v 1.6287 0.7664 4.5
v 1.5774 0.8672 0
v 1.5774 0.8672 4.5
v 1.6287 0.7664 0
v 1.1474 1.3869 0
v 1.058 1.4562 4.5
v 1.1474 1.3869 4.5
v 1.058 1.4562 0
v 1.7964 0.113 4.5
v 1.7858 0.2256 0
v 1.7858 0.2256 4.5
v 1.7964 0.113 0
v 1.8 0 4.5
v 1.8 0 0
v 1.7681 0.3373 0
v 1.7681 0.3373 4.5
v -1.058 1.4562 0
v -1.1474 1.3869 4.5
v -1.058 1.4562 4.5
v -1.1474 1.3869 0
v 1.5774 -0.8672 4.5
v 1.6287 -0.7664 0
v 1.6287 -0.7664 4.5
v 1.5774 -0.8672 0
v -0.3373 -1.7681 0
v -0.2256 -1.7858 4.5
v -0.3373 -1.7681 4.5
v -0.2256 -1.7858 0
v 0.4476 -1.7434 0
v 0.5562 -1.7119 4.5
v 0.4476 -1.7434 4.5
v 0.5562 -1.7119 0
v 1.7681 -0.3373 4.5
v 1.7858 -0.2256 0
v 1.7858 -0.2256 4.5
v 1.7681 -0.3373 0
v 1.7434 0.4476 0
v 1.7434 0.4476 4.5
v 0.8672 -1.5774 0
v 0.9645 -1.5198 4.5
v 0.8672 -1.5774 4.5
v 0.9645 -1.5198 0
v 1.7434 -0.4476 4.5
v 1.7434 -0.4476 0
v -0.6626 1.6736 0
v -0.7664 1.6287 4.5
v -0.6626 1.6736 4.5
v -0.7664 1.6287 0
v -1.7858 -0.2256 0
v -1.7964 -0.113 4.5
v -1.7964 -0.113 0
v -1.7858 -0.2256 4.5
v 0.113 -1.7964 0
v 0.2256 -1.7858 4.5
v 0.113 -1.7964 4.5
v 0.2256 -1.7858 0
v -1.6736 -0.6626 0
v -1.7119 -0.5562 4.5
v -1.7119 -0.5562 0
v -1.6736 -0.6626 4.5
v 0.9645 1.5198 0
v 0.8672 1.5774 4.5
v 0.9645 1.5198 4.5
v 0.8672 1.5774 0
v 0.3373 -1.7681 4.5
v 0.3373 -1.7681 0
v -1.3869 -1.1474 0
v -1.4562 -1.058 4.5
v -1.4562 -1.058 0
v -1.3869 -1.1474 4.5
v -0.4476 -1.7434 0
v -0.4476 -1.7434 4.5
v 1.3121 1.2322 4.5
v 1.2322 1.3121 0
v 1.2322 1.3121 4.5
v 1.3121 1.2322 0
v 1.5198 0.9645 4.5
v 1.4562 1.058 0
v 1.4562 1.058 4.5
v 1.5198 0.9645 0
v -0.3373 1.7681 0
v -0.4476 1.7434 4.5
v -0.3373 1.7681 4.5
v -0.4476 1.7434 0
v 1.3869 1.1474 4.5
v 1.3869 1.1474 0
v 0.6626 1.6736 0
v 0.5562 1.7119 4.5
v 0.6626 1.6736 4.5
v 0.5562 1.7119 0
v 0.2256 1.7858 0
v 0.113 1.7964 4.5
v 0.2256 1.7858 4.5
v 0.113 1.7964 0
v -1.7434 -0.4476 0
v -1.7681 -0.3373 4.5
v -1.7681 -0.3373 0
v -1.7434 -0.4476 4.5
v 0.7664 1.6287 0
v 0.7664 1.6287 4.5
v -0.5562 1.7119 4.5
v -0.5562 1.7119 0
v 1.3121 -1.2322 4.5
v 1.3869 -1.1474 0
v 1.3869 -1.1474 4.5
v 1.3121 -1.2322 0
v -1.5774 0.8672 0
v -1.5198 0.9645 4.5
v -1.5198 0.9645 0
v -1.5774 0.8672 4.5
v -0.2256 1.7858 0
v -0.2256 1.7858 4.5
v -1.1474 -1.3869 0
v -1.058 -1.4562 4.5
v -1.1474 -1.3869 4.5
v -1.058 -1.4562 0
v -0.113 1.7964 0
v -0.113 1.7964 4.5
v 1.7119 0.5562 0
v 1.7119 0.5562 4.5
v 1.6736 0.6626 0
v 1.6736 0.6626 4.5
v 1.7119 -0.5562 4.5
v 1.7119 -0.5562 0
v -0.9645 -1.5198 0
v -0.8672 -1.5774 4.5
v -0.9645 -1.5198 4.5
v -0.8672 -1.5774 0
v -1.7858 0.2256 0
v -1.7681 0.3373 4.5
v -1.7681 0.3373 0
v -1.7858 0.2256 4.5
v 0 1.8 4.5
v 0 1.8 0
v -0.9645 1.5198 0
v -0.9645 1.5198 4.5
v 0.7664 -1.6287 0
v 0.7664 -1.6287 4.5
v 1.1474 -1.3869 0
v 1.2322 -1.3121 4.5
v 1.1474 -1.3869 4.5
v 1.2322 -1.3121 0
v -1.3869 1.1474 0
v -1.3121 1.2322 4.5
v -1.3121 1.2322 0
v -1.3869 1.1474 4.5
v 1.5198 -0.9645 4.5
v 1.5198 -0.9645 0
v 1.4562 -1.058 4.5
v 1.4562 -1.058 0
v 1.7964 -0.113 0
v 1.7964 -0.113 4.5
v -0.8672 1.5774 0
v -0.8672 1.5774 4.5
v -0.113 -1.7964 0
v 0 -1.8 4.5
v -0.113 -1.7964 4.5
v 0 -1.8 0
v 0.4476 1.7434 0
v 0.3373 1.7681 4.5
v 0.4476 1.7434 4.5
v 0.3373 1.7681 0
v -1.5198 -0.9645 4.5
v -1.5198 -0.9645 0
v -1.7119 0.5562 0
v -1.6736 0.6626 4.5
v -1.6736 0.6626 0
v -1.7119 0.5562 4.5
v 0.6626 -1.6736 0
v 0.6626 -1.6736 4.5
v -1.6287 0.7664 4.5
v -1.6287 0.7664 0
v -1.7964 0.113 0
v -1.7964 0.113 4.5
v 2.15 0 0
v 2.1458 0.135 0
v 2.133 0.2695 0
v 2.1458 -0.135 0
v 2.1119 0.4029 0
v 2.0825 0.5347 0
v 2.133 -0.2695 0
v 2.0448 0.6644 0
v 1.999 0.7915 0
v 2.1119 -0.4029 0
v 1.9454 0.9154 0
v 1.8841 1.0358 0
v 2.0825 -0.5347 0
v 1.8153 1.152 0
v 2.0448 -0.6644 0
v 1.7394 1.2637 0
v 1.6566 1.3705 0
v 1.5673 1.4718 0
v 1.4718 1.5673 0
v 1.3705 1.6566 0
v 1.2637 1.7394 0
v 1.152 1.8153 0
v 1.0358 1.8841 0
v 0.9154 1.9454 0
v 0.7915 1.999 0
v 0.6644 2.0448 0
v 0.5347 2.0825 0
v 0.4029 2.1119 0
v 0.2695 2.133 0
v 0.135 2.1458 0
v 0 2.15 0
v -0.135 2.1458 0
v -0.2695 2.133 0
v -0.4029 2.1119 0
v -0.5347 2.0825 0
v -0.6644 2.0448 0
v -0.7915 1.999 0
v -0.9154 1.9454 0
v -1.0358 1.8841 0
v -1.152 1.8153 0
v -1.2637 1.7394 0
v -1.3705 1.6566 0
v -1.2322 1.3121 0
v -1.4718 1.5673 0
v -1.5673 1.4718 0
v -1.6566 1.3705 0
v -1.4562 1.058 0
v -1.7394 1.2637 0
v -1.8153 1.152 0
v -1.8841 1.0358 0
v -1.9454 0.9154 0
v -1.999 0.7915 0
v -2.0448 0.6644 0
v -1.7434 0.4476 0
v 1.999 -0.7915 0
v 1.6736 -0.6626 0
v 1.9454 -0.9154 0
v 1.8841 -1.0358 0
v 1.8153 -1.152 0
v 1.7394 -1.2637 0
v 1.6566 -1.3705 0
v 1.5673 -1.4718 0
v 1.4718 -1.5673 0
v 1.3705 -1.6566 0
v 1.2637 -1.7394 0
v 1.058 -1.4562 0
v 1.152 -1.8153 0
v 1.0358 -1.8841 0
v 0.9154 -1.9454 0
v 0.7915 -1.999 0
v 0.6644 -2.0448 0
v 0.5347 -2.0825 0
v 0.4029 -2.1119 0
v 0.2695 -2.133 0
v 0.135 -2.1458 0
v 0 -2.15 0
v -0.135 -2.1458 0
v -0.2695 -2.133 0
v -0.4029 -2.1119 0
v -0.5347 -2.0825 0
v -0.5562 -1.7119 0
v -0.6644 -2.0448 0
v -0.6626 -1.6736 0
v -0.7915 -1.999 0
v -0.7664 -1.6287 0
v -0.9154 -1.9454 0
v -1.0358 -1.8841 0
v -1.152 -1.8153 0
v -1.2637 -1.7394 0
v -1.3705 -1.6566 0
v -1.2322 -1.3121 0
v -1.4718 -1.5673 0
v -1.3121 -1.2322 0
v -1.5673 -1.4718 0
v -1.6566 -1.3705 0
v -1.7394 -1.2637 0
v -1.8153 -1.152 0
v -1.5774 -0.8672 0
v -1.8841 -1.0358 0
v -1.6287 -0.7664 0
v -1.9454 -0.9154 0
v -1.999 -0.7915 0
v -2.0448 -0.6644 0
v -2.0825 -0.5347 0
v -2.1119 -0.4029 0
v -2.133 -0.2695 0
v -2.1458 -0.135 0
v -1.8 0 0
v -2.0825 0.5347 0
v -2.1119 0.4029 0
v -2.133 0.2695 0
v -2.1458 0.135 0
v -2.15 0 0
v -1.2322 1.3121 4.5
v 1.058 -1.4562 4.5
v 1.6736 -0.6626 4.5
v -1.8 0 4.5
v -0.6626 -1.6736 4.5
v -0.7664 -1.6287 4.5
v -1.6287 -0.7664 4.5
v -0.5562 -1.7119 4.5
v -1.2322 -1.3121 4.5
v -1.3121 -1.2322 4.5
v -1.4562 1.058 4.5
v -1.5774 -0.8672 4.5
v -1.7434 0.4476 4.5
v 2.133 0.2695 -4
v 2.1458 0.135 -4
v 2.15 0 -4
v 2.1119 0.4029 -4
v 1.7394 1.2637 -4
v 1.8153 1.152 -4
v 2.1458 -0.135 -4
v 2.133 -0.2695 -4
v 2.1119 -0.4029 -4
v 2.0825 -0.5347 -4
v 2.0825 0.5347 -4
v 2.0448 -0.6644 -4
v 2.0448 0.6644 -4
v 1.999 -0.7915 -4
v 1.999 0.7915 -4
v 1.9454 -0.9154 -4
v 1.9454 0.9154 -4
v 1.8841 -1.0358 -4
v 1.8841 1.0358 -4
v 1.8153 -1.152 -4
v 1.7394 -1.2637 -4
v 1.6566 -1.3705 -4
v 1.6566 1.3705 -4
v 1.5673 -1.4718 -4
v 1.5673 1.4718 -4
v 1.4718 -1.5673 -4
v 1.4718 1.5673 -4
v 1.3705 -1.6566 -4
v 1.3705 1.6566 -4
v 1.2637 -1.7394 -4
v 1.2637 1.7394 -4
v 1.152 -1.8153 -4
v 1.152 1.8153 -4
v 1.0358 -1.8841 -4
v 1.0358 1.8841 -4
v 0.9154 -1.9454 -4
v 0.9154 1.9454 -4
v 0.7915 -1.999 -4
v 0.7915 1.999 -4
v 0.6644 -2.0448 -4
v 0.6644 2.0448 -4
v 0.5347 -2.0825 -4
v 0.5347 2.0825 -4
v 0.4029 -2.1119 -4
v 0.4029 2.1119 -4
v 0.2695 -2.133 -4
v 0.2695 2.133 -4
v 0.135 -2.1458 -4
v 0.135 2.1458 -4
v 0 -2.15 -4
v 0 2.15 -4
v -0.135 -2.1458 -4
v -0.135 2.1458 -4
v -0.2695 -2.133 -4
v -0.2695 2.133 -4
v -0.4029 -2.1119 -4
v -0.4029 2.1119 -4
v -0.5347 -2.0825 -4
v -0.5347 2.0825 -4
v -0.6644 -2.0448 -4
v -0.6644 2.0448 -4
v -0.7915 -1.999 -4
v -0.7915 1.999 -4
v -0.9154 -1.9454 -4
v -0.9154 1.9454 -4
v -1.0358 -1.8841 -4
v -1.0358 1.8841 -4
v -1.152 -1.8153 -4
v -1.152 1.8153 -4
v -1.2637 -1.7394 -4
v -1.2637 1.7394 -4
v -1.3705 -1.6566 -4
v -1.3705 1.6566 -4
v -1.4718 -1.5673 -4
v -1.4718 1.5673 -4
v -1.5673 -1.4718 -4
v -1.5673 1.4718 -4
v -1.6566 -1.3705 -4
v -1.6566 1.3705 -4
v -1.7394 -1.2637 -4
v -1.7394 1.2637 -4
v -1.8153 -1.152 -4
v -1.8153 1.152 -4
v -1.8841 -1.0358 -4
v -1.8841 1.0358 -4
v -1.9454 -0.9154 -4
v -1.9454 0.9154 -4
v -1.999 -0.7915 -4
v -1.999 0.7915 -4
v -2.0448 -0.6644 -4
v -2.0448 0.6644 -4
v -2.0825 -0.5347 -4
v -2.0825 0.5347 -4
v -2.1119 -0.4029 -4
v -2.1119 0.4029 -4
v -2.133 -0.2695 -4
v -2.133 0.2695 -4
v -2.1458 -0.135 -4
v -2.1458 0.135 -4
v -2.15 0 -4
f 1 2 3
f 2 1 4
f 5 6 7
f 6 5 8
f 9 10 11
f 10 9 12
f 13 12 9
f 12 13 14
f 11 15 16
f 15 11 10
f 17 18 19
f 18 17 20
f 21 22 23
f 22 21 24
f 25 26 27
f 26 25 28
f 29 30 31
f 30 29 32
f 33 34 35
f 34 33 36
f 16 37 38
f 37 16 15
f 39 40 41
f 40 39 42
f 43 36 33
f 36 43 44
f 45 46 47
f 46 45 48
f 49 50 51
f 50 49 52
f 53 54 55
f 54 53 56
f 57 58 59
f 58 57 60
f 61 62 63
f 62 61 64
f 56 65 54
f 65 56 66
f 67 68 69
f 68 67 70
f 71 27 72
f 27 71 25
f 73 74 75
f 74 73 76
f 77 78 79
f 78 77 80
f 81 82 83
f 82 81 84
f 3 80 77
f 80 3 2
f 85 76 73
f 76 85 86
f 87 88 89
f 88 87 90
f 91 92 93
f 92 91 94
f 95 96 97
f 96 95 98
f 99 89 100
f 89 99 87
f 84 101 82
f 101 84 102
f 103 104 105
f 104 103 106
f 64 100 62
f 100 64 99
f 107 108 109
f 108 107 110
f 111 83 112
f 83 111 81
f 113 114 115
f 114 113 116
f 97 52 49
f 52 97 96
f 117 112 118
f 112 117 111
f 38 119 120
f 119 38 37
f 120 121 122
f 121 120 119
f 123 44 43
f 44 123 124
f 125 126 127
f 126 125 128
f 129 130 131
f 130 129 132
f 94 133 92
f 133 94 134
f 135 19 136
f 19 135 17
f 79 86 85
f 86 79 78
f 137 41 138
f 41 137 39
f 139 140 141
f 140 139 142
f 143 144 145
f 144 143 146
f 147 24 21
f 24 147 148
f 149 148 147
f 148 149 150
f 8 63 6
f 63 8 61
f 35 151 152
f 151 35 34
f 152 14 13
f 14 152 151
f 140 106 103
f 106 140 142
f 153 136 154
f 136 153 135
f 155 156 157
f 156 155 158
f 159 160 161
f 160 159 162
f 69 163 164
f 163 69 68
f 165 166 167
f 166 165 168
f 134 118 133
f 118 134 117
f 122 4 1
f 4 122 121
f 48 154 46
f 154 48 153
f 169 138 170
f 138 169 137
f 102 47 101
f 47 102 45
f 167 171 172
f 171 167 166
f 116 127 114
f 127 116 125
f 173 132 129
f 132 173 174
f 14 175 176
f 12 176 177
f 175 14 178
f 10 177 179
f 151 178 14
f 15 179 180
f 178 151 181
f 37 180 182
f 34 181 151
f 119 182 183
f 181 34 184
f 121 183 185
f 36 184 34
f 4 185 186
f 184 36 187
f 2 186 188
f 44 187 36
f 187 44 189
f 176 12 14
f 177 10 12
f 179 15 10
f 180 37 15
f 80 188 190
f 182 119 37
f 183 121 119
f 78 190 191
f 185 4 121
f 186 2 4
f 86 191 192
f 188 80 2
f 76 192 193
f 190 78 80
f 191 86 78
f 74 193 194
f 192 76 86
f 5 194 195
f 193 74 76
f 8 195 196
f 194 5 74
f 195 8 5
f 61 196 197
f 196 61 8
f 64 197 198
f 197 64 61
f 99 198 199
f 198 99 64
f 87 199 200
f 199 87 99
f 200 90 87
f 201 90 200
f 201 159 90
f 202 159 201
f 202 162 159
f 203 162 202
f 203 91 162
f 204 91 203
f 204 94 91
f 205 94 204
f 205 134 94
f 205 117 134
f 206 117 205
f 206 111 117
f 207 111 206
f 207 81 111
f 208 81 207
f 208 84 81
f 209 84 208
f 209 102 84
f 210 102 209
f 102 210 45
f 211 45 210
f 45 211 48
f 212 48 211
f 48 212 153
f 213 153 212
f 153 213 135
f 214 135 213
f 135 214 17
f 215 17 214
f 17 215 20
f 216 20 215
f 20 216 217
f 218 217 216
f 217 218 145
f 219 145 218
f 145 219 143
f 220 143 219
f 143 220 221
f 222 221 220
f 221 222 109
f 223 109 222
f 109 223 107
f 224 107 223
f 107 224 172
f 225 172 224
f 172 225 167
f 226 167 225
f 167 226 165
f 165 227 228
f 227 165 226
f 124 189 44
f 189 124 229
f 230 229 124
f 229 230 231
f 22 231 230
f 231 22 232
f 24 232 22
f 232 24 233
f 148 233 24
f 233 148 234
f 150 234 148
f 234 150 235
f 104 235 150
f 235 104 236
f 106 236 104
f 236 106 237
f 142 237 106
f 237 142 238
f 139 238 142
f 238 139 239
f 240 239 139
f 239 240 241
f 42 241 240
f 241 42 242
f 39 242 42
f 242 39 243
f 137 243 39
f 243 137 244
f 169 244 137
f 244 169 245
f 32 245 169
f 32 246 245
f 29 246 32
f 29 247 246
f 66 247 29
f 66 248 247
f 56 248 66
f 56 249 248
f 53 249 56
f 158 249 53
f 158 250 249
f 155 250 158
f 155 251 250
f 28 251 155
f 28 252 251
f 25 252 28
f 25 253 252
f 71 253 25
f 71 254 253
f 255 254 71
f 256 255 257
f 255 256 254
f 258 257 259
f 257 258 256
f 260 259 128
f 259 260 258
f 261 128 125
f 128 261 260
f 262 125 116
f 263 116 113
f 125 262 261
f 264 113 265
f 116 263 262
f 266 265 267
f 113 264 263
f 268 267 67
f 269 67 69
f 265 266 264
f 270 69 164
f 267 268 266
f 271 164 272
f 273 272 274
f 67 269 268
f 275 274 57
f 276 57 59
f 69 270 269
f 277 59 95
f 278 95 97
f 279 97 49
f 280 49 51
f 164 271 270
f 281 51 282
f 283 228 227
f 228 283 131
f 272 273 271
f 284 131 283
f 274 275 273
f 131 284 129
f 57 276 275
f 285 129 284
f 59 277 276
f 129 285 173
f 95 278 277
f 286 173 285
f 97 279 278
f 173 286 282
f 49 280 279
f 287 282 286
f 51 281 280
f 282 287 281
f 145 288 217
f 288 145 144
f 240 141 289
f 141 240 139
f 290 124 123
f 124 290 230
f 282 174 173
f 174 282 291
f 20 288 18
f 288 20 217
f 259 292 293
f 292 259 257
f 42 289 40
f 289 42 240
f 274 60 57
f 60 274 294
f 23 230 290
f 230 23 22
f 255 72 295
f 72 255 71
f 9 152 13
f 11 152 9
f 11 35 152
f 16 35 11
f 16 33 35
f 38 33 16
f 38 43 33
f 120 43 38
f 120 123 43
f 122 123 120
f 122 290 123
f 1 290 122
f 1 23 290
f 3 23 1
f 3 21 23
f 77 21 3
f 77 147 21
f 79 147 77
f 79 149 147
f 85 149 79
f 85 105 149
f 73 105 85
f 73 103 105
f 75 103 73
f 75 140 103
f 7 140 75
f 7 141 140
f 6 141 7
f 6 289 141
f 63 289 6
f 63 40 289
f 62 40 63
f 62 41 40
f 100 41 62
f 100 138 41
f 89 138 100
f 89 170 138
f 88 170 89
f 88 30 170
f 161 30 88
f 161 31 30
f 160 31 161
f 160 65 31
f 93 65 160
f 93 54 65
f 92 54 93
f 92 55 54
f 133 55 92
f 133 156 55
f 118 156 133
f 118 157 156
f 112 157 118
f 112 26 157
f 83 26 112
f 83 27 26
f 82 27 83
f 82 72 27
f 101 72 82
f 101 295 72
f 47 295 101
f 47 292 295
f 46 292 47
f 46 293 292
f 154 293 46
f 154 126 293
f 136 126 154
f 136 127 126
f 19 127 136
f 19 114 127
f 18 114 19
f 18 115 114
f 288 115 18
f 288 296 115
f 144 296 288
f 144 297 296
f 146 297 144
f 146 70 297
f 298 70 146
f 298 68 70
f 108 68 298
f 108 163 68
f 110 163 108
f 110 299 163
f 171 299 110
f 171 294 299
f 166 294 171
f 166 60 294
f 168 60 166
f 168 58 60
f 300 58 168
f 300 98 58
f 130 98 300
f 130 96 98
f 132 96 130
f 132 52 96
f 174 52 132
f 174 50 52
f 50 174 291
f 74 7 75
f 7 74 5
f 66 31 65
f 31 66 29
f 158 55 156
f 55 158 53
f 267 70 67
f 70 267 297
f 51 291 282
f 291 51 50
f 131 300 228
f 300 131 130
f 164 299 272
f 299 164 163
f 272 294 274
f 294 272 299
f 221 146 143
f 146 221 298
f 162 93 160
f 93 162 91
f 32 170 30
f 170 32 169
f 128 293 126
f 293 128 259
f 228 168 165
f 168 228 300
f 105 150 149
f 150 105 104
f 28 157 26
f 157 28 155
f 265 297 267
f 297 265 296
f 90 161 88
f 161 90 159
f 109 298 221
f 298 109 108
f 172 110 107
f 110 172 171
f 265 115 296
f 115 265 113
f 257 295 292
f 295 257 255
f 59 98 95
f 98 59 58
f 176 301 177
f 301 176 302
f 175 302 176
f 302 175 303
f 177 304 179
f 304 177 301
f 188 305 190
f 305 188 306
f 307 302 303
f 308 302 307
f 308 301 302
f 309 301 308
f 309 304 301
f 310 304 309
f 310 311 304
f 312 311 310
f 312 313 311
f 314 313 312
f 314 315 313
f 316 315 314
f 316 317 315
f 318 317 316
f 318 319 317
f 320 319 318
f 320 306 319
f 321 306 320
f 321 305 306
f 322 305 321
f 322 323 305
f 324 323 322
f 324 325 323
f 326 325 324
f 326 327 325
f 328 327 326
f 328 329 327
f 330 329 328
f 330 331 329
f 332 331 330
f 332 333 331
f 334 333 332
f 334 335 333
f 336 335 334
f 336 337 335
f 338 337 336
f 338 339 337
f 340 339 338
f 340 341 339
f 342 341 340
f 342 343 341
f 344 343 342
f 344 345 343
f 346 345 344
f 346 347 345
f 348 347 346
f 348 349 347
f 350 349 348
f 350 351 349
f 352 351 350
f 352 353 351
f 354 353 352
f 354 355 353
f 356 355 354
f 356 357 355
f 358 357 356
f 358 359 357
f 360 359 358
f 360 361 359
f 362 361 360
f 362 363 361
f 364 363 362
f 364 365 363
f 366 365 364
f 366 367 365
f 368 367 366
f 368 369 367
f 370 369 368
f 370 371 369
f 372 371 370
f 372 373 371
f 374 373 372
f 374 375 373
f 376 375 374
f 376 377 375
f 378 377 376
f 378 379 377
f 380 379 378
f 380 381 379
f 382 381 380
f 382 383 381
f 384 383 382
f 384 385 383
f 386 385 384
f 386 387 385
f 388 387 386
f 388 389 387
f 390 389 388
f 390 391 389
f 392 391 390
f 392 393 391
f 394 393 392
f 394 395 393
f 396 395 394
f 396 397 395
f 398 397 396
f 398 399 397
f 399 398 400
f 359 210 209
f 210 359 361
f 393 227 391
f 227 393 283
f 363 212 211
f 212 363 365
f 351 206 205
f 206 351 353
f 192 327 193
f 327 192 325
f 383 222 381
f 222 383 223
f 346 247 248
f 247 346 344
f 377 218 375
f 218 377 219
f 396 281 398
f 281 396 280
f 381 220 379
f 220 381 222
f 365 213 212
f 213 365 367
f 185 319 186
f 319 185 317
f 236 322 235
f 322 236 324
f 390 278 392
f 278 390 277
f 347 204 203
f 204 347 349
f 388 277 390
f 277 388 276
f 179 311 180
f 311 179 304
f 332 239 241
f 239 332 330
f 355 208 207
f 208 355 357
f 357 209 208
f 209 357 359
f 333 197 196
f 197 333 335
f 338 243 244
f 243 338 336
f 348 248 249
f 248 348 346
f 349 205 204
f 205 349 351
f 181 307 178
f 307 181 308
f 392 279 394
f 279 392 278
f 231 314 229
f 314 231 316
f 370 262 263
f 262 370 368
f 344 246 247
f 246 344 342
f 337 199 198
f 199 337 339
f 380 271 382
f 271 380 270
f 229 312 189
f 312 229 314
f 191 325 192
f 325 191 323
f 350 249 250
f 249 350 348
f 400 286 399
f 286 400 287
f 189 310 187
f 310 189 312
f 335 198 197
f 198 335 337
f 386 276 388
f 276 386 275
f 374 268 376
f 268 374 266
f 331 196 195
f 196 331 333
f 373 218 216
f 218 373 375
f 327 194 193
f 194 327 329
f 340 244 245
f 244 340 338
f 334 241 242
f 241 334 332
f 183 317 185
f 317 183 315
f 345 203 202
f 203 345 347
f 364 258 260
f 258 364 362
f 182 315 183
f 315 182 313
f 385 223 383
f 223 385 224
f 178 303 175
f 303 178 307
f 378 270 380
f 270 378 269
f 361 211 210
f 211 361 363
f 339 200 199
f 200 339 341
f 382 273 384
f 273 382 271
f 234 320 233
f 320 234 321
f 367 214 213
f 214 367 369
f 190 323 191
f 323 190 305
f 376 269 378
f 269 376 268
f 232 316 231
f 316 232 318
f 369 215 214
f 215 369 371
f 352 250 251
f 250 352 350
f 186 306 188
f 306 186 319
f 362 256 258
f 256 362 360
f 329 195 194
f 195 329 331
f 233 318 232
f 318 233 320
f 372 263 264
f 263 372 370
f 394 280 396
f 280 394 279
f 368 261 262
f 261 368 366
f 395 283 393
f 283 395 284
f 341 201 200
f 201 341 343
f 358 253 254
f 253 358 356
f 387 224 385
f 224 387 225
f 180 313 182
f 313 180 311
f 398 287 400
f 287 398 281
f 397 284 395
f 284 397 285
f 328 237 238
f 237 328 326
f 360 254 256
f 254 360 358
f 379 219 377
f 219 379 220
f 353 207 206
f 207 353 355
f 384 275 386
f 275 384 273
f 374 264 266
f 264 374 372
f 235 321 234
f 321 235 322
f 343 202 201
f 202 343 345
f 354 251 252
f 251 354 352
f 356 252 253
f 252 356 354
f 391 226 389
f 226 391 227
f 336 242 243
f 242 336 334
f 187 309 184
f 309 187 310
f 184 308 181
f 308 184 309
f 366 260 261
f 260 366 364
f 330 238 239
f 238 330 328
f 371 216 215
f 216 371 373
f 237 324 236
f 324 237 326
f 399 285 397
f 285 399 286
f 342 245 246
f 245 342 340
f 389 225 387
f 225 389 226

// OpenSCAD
tolerance = 0.3;
$fn = $preview ? 20 : 100;

module led(d = 3, flange_d = undef) {
    flange_d = flange_d ? flange_d : d + 0.7;
    // main led part, without flange
    cylinder(d = d + (2 * tolerance), h = d*1.5);

    // flange and hole
    translate([0, 0, -4])
    cylinder(d = flange_d + (2 * tolerance), h = 4);
}

led();
